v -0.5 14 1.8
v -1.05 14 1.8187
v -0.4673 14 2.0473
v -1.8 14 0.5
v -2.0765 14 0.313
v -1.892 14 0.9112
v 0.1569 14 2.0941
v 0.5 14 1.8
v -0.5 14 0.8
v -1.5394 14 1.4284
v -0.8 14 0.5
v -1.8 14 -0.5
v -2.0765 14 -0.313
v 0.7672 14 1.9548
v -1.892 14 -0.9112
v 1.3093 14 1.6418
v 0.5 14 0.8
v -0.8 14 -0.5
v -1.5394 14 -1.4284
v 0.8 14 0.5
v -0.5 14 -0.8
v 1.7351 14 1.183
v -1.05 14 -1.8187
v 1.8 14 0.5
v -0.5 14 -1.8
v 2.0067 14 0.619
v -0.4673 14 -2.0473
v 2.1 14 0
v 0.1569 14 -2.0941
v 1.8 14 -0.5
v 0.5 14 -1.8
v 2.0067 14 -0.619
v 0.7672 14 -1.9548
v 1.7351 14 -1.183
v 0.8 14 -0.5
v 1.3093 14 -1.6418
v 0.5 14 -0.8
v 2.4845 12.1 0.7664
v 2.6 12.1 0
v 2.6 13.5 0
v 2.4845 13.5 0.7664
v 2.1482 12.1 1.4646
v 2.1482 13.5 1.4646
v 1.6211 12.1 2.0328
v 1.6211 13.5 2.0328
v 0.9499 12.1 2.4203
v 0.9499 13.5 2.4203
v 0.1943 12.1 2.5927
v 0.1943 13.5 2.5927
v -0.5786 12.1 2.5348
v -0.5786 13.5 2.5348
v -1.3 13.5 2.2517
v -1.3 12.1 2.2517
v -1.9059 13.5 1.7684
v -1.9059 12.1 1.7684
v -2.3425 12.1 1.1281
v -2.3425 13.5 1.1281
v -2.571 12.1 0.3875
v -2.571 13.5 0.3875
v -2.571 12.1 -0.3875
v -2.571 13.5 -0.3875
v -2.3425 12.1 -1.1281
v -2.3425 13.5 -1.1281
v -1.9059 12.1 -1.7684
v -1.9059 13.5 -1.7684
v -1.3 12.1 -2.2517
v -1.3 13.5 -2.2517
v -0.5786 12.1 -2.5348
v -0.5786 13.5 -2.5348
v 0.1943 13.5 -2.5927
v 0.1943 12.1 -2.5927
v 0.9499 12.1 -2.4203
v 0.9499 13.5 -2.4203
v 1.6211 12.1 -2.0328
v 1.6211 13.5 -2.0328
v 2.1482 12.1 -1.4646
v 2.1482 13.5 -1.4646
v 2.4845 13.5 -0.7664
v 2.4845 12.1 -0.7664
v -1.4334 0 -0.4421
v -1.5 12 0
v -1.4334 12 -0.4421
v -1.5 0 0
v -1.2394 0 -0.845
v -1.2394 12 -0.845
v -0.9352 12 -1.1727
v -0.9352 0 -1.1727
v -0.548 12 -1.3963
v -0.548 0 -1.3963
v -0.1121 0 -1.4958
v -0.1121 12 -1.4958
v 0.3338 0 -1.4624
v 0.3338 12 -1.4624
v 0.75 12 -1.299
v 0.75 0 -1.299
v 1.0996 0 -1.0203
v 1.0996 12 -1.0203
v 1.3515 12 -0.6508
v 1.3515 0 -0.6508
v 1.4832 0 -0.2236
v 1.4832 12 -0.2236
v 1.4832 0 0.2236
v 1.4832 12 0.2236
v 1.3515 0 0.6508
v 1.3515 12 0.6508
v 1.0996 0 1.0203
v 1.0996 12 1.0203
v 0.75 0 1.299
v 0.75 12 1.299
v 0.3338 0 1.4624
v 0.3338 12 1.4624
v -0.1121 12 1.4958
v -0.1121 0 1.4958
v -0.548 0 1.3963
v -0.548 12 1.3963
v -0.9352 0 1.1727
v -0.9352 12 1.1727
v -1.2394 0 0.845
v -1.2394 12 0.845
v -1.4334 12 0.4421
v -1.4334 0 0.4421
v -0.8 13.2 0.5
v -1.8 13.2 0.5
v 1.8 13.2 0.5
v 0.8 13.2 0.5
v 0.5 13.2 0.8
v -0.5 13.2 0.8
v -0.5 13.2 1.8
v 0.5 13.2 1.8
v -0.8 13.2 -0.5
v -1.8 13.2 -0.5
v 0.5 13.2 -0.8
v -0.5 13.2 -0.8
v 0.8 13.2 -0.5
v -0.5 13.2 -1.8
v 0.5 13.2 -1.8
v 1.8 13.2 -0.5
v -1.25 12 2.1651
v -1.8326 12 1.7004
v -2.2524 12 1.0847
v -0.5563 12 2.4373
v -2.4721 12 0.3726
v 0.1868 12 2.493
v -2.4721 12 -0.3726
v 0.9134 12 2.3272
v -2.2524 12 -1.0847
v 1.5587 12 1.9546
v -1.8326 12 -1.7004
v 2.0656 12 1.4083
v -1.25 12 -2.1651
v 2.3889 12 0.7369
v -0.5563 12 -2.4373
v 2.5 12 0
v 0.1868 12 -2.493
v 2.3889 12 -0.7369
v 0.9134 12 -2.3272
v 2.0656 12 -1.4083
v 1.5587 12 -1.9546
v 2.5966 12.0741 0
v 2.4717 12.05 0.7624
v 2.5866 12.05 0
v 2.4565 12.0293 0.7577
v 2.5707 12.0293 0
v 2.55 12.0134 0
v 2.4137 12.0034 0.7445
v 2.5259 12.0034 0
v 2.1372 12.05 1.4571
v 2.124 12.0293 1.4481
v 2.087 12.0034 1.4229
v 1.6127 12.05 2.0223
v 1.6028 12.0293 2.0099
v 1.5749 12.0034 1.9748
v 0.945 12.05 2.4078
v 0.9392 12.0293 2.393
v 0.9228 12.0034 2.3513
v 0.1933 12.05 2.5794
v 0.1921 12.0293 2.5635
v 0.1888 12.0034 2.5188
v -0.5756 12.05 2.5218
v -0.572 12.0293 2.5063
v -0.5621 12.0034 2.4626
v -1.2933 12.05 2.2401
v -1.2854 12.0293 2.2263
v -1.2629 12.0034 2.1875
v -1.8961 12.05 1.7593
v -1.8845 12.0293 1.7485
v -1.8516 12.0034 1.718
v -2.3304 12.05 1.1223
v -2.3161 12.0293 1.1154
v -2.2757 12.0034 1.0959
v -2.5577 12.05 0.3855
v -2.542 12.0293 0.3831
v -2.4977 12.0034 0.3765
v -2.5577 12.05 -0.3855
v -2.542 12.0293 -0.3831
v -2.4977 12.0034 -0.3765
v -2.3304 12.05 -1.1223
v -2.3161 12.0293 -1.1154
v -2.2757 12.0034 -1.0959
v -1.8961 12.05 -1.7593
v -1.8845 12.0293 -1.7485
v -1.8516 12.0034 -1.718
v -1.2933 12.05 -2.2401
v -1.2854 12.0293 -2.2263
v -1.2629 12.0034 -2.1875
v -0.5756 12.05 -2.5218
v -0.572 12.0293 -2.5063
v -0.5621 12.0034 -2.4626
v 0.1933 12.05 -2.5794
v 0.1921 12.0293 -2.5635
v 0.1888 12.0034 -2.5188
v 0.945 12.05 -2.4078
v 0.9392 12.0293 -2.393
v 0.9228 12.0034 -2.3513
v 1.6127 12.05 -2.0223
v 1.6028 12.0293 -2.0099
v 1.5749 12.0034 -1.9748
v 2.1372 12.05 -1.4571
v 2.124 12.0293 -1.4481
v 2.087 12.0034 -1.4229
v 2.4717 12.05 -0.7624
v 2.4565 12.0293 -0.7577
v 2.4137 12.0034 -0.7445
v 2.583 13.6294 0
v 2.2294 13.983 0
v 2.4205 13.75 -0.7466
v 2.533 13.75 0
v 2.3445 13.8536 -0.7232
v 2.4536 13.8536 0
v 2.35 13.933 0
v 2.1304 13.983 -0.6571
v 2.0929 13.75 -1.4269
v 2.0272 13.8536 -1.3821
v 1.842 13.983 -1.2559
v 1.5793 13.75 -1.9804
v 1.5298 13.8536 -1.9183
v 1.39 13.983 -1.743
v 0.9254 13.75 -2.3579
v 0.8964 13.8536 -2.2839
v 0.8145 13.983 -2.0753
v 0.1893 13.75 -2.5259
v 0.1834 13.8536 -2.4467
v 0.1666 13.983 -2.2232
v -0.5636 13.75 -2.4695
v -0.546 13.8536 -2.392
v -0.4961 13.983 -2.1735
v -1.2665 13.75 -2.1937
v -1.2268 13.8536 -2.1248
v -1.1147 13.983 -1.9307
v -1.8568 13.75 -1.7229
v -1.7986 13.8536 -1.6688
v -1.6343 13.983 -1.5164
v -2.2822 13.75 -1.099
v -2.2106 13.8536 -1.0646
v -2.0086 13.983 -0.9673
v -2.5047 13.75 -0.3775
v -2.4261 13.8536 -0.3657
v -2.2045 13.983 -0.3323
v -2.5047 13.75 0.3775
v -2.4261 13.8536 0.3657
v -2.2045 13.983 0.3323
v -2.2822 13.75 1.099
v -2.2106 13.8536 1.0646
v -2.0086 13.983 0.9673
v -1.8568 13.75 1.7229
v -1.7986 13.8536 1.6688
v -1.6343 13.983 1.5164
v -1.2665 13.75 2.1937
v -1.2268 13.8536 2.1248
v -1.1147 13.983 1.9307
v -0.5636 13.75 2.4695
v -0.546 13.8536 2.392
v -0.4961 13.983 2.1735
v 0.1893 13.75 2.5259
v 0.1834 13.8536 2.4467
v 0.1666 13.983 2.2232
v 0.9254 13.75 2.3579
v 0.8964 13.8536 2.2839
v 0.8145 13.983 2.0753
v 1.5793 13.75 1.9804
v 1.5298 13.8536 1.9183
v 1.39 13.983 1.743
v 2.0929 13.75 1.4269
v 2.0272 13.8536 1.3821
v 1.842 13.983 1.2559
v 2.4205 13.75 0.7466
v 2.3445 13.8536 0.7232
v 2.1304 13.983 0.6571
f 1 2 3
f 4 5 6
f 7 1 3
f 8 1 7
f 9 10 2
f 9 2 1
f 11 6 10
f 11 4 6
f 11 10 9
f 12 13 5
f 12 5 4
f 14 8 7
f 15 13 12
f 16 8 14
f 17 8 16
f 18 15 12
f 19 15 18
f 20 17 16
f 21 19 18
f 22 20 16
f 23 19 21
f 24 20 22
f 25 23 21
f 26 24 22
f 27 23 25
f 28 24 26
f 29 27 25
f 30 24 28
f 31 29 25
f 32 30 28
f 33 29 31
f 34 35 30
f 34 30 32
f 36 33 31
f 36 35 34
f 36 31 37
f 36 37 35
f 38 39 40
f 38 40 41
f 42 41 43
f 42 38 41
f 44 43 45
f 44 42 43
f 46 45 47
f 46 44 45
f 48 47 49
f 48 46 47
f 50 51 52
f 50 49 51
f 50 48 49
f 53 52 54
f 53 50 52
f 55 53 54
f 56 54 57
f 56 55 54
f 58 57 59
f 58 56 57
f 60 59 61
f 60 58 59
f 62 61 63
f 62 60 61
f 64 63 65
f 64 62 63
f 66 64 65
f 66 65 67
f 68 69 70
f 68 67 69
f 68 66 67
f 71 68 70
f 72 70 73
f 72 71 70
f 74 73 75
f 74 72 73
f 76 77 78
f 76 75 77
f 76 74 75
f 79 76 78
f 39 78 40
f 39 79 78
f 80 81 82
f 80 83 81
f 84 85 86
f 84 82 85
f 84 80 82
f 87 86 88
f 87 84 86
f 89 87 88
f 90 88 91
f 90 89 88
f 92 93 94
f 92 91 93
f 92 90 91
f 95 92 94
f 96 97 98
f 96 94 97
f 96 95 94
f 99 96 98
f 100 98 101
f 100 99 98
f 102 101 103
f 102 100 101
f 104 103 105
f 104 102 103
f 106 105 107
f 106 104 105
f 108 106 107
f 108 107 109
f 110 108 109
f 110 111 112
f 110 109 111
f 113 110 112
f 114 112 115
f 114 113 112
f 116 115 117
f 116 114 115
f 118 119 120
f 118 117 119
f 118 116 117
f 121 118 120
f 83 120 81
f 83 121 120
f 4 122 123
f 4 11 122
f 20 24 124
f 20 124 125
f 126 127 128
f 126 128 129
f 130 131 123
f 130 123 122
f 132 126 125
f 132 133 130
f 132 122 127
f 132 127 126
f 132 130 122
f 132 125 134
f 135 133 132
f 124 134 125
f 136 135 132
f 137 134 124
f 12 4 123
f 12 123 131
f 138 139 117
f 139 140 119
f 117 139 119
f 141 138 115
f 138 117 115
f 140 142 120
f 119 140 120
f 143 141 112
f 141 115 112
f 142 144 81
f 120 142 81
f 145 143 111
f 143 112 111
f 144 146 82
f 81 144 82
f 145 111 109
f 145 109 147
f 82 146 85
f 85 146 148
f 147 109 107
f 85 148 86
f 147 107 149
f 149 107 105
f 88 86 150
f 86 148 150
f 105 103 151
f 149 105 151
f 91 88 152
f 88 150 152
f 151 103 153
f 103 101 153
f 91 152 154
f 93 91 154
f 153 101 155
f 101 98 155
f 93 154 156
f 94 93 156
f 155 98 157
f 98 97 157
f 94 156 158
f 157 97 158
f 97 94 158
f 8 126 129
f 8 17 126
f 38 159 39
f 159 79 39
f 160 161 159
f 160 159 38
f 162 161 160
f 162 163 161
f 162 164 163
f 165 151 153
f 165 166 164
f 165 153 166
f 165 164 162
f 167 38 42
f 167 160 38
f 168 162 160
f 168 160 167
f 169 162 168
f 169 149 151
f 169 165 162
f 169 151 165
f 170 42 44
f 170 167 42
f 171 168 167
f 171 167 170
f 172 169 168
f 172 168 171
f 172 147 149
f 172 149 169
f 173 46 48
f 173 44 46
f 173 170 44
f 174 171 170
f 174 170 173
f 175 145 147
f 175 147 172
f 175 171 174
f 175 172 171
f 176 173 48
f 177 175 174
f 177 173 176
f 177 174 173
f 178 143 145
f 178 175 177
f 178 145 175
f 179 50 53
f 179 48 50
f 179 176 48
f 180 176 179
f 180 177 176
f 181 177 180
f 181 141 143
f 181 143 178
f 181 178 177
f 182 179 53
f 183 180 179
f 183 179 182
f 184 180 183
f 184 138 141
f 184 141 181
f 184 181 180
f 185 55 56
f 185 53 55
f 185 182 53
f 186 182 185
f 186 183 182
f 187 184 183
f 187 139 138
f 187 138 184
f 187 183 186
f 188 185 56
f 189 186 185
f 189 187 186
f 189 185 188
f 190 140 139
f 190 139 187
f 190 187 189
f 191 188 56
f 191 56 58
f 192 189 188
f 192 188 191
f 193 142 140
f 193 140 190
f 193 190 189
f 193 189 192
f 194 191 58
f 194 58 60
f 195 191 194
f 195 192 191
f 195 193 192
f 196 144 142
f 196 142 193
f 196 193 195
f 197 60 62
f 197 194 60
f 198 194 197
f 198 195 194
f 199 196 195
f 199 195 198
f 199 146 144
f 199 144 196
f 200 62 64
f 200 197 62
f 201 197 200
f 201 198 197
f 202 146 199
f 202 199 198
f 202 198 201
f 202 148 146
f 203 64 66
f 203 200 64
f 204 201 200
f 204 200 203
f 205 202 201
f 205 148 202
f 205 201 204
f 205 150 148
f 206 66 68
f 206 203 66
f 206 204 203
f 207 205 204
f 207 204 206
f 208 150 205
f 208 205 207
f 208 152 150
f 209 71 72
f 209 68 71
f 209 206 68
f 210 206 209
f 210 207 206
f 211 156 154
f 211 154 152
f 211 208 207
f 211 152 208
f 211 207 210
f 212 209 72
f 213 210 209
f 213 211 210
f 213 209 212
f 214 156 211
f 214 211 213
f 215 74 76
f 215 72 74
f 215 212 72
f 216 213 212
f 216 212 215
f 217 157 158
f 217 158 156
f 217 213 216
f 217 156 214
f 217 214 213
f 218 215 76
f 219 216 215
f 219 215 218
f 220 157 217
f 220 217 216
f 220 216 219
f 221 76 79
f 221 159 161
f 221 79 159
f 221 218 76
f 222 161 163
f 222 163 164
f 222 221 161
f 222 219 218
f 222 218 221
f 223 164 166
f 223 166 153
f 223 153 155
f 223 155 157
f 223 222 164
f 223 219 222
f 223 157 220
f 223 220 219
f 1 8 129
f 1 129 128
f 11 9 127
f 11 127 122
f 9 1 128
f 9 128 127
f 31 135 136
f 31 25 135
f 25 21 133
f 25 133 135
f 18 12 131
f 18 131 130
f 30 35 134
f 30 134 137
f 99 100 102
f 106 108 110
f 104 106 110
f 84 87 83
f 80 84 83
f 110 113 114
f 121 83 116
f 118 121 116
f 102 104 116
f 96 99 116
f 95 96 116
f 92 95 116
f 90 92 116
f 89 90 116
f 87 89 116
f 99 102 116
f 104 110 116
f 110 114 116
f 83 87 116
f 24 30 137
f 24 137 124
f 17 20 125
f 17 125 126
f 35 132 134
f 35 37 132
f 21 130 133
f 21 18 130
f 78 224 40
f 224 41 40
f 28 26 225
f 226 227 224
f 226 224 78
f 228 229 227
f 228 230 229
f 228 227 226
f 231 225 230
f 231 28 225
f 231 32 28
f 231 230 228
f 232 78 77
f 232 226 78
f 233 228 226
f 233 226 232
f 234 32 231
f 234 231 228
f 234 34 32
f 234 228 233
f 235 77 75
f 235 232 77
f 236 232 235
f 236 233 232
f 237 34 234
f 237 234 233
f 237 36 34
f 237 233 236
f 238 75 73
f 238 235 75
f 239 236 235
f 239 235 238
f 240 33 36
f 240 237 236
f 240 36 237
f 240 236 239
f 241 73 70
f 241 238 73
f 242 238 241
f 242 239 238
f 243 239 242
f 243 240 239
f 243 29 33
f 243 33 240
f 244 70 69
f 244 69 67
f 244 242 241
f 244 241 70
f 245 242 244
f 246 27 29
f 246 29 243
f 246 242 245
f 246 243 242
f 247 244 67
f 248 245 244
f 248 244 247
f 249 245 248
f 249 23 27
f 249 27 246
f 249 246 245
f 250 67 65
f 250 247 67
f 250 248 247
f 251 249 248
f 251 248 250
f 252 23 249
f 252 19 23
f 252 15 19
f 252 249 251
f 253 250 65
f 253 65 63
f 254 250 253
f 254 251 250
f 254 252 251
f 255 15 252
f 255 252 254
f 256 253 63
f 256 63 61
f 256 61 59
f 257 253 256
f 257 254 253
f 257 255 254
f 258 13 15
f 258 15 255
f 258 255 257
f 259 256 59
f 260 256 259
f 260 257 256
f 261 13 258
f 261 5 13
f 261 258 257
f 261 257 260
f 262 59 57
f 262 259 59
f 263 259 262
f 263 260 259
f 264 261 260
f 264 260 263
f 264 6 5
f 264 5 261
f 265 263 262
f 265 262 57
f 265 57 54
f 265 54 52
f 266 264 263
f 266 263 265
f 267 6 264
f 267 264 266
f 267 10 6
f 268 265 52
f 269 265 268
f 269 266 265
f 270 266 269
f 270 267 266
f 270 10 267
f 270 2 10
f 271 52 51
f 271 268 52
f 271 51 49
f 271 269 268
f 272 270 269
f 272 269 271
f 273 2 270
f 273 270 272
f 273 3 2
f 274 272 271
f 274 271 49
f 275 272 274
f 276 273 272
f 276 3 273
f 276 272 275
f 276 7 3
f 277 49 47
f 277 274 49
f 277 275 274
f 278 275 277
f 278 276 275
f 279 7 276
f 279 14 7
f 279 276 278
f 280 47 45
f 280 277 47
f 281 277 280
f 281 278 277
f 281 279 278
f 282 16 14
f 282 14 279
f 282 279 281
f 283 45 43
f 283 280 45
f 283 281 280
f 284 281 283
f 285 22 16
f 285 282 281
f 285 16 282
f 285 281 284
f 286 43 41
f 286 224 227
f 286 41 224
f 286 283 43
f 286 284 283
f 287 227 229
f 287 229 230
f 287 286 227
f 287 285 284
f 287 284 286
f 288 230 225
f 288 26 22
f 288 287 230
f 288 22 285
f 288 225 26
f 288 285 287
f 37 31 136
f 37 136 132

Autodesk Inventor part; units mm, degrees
ref_plane "YZ Plane" through (0, 0, 0) normal (1, 0, 0) x (0, 1, 0)
ref_plane "XZ Plane" through (0, 0, 0) normal (0, 1, 0) x (-1, 0, 0)
ref_plane "XY Plane" through (0, 0, 0) normal (0, 0, 1) x (1, 0, 0)
sketch "Sketch1" plane through (0, 0, 0) normal (0, 1, 0) x (-1, 0, 0)
  circle A0 centre (0, 0) radius 1.5
  dimension "d0" = 3
extrude "Extrusion1" add sketch "Sketch1" along normal blind 12
sketch "Sketch2" plane through (0, 12, 0) normal (0, 1, 0) x (1, 0, 0)
  circle A0 centre (0, 0) radius 2.6
  dimension "d3" = 5.2
extrude "Extrusion2" add sketch "Sketch2" along normal blind 2
sketch "Sketch3" plane through (0, 14, 0) normal (0, 1, 0) x (1, 0, 0)
  line L0 (-1.8, 0.5) -> (-0.8, 0.5)
  line L1 (-0.8, 0.5) -> (-0.5, 0.8)
  line L2 (-0.5, 0.8) -> (-0.5, 1.8)
  line L3 (-0.5, 1.8) -> (0.5, 1.8)
  line L4 (0.5, 1.8) -> (0.5, 0.8)
  line L5 (0.5, 0.8) -> (0.8, 0.5)
  line L6 (0.8, 0.5) -> (1.8, 0.5)
  line L7 (1.8, 0.5) -> (1.8, -0.5)
  line L8 (1.8, -0.5) -> (0.8, -0.5)
  line L9 (0.8, -0.5) -> (0.5, -0.8)
  line L10 (0.5, -0.8) -> (0.5, -1.8)
  line L11 (0.5, -1.8) -> (-0.5, -1.8)
  line L12 (-0.5, -1.8) -> (-0.5, -0.8)
  line L13 (-0.5, -0.8) -> (-0.8, -0.5)
  line L14 (-0.8, -0.5) -> (-1.8, -0.5)
  line L15 (-1.8, -0.5) -> (-1.8, 0.5)
  point P0 (0, 0)
  dimension "d6" = 1
  dimension "d7" = 1
  dimension "d8" = 1
  dimension "d9" = 1
  dimension "d11" = 1
  dimension "d12" = 1
  dimension "d13" = 1
  dimension "d14" = 1
  dimension "d15" = 1
  dimension "d16" = 1
  dimension "d17" = 135
  dimension "d18" = 135
  dimension "d19" = 135
  dimension "d20" = 0.5
  dimension "d21" = 0.5
  dimension "d22" = 1.8
  dimension "d23" = 1.8
  dimension "d24" = 0.5
extrude "Extrusion3" cut sketch "Sketch3" against normal blind 0.8
fillet "Fillet1" radius 0.5 1 edges at (-2.6, 14, 0)
fillet "Fillet2" radius 0.1 1 edges at (-2.6, 12, 0)
thread "Thread1" size "G 1/16-28" class "A" standard "BSP Pipe Threads" full length
equation "\"d7\" = d6"
equation "\"d8\" = d6"
equation "\"d9\" = d6"
equation "\"d11\" = d6"
equation "\"d12\" = d6"
equation "\"d13\" = d6"
equation "\"d14\" = d6"
equation "\"d15\" = d6"
equation "\"d16\" = d6"
equation "\"d18\" = d17"
equation "\"d19\" = d17"
equation "\"d20\" = 0.5 * d16"
equation "\"d21\" = 0.5 * d16"
equation "\"d24\" = 0.5 * d16"
properties part number "plastic_screw_3_x_12"
